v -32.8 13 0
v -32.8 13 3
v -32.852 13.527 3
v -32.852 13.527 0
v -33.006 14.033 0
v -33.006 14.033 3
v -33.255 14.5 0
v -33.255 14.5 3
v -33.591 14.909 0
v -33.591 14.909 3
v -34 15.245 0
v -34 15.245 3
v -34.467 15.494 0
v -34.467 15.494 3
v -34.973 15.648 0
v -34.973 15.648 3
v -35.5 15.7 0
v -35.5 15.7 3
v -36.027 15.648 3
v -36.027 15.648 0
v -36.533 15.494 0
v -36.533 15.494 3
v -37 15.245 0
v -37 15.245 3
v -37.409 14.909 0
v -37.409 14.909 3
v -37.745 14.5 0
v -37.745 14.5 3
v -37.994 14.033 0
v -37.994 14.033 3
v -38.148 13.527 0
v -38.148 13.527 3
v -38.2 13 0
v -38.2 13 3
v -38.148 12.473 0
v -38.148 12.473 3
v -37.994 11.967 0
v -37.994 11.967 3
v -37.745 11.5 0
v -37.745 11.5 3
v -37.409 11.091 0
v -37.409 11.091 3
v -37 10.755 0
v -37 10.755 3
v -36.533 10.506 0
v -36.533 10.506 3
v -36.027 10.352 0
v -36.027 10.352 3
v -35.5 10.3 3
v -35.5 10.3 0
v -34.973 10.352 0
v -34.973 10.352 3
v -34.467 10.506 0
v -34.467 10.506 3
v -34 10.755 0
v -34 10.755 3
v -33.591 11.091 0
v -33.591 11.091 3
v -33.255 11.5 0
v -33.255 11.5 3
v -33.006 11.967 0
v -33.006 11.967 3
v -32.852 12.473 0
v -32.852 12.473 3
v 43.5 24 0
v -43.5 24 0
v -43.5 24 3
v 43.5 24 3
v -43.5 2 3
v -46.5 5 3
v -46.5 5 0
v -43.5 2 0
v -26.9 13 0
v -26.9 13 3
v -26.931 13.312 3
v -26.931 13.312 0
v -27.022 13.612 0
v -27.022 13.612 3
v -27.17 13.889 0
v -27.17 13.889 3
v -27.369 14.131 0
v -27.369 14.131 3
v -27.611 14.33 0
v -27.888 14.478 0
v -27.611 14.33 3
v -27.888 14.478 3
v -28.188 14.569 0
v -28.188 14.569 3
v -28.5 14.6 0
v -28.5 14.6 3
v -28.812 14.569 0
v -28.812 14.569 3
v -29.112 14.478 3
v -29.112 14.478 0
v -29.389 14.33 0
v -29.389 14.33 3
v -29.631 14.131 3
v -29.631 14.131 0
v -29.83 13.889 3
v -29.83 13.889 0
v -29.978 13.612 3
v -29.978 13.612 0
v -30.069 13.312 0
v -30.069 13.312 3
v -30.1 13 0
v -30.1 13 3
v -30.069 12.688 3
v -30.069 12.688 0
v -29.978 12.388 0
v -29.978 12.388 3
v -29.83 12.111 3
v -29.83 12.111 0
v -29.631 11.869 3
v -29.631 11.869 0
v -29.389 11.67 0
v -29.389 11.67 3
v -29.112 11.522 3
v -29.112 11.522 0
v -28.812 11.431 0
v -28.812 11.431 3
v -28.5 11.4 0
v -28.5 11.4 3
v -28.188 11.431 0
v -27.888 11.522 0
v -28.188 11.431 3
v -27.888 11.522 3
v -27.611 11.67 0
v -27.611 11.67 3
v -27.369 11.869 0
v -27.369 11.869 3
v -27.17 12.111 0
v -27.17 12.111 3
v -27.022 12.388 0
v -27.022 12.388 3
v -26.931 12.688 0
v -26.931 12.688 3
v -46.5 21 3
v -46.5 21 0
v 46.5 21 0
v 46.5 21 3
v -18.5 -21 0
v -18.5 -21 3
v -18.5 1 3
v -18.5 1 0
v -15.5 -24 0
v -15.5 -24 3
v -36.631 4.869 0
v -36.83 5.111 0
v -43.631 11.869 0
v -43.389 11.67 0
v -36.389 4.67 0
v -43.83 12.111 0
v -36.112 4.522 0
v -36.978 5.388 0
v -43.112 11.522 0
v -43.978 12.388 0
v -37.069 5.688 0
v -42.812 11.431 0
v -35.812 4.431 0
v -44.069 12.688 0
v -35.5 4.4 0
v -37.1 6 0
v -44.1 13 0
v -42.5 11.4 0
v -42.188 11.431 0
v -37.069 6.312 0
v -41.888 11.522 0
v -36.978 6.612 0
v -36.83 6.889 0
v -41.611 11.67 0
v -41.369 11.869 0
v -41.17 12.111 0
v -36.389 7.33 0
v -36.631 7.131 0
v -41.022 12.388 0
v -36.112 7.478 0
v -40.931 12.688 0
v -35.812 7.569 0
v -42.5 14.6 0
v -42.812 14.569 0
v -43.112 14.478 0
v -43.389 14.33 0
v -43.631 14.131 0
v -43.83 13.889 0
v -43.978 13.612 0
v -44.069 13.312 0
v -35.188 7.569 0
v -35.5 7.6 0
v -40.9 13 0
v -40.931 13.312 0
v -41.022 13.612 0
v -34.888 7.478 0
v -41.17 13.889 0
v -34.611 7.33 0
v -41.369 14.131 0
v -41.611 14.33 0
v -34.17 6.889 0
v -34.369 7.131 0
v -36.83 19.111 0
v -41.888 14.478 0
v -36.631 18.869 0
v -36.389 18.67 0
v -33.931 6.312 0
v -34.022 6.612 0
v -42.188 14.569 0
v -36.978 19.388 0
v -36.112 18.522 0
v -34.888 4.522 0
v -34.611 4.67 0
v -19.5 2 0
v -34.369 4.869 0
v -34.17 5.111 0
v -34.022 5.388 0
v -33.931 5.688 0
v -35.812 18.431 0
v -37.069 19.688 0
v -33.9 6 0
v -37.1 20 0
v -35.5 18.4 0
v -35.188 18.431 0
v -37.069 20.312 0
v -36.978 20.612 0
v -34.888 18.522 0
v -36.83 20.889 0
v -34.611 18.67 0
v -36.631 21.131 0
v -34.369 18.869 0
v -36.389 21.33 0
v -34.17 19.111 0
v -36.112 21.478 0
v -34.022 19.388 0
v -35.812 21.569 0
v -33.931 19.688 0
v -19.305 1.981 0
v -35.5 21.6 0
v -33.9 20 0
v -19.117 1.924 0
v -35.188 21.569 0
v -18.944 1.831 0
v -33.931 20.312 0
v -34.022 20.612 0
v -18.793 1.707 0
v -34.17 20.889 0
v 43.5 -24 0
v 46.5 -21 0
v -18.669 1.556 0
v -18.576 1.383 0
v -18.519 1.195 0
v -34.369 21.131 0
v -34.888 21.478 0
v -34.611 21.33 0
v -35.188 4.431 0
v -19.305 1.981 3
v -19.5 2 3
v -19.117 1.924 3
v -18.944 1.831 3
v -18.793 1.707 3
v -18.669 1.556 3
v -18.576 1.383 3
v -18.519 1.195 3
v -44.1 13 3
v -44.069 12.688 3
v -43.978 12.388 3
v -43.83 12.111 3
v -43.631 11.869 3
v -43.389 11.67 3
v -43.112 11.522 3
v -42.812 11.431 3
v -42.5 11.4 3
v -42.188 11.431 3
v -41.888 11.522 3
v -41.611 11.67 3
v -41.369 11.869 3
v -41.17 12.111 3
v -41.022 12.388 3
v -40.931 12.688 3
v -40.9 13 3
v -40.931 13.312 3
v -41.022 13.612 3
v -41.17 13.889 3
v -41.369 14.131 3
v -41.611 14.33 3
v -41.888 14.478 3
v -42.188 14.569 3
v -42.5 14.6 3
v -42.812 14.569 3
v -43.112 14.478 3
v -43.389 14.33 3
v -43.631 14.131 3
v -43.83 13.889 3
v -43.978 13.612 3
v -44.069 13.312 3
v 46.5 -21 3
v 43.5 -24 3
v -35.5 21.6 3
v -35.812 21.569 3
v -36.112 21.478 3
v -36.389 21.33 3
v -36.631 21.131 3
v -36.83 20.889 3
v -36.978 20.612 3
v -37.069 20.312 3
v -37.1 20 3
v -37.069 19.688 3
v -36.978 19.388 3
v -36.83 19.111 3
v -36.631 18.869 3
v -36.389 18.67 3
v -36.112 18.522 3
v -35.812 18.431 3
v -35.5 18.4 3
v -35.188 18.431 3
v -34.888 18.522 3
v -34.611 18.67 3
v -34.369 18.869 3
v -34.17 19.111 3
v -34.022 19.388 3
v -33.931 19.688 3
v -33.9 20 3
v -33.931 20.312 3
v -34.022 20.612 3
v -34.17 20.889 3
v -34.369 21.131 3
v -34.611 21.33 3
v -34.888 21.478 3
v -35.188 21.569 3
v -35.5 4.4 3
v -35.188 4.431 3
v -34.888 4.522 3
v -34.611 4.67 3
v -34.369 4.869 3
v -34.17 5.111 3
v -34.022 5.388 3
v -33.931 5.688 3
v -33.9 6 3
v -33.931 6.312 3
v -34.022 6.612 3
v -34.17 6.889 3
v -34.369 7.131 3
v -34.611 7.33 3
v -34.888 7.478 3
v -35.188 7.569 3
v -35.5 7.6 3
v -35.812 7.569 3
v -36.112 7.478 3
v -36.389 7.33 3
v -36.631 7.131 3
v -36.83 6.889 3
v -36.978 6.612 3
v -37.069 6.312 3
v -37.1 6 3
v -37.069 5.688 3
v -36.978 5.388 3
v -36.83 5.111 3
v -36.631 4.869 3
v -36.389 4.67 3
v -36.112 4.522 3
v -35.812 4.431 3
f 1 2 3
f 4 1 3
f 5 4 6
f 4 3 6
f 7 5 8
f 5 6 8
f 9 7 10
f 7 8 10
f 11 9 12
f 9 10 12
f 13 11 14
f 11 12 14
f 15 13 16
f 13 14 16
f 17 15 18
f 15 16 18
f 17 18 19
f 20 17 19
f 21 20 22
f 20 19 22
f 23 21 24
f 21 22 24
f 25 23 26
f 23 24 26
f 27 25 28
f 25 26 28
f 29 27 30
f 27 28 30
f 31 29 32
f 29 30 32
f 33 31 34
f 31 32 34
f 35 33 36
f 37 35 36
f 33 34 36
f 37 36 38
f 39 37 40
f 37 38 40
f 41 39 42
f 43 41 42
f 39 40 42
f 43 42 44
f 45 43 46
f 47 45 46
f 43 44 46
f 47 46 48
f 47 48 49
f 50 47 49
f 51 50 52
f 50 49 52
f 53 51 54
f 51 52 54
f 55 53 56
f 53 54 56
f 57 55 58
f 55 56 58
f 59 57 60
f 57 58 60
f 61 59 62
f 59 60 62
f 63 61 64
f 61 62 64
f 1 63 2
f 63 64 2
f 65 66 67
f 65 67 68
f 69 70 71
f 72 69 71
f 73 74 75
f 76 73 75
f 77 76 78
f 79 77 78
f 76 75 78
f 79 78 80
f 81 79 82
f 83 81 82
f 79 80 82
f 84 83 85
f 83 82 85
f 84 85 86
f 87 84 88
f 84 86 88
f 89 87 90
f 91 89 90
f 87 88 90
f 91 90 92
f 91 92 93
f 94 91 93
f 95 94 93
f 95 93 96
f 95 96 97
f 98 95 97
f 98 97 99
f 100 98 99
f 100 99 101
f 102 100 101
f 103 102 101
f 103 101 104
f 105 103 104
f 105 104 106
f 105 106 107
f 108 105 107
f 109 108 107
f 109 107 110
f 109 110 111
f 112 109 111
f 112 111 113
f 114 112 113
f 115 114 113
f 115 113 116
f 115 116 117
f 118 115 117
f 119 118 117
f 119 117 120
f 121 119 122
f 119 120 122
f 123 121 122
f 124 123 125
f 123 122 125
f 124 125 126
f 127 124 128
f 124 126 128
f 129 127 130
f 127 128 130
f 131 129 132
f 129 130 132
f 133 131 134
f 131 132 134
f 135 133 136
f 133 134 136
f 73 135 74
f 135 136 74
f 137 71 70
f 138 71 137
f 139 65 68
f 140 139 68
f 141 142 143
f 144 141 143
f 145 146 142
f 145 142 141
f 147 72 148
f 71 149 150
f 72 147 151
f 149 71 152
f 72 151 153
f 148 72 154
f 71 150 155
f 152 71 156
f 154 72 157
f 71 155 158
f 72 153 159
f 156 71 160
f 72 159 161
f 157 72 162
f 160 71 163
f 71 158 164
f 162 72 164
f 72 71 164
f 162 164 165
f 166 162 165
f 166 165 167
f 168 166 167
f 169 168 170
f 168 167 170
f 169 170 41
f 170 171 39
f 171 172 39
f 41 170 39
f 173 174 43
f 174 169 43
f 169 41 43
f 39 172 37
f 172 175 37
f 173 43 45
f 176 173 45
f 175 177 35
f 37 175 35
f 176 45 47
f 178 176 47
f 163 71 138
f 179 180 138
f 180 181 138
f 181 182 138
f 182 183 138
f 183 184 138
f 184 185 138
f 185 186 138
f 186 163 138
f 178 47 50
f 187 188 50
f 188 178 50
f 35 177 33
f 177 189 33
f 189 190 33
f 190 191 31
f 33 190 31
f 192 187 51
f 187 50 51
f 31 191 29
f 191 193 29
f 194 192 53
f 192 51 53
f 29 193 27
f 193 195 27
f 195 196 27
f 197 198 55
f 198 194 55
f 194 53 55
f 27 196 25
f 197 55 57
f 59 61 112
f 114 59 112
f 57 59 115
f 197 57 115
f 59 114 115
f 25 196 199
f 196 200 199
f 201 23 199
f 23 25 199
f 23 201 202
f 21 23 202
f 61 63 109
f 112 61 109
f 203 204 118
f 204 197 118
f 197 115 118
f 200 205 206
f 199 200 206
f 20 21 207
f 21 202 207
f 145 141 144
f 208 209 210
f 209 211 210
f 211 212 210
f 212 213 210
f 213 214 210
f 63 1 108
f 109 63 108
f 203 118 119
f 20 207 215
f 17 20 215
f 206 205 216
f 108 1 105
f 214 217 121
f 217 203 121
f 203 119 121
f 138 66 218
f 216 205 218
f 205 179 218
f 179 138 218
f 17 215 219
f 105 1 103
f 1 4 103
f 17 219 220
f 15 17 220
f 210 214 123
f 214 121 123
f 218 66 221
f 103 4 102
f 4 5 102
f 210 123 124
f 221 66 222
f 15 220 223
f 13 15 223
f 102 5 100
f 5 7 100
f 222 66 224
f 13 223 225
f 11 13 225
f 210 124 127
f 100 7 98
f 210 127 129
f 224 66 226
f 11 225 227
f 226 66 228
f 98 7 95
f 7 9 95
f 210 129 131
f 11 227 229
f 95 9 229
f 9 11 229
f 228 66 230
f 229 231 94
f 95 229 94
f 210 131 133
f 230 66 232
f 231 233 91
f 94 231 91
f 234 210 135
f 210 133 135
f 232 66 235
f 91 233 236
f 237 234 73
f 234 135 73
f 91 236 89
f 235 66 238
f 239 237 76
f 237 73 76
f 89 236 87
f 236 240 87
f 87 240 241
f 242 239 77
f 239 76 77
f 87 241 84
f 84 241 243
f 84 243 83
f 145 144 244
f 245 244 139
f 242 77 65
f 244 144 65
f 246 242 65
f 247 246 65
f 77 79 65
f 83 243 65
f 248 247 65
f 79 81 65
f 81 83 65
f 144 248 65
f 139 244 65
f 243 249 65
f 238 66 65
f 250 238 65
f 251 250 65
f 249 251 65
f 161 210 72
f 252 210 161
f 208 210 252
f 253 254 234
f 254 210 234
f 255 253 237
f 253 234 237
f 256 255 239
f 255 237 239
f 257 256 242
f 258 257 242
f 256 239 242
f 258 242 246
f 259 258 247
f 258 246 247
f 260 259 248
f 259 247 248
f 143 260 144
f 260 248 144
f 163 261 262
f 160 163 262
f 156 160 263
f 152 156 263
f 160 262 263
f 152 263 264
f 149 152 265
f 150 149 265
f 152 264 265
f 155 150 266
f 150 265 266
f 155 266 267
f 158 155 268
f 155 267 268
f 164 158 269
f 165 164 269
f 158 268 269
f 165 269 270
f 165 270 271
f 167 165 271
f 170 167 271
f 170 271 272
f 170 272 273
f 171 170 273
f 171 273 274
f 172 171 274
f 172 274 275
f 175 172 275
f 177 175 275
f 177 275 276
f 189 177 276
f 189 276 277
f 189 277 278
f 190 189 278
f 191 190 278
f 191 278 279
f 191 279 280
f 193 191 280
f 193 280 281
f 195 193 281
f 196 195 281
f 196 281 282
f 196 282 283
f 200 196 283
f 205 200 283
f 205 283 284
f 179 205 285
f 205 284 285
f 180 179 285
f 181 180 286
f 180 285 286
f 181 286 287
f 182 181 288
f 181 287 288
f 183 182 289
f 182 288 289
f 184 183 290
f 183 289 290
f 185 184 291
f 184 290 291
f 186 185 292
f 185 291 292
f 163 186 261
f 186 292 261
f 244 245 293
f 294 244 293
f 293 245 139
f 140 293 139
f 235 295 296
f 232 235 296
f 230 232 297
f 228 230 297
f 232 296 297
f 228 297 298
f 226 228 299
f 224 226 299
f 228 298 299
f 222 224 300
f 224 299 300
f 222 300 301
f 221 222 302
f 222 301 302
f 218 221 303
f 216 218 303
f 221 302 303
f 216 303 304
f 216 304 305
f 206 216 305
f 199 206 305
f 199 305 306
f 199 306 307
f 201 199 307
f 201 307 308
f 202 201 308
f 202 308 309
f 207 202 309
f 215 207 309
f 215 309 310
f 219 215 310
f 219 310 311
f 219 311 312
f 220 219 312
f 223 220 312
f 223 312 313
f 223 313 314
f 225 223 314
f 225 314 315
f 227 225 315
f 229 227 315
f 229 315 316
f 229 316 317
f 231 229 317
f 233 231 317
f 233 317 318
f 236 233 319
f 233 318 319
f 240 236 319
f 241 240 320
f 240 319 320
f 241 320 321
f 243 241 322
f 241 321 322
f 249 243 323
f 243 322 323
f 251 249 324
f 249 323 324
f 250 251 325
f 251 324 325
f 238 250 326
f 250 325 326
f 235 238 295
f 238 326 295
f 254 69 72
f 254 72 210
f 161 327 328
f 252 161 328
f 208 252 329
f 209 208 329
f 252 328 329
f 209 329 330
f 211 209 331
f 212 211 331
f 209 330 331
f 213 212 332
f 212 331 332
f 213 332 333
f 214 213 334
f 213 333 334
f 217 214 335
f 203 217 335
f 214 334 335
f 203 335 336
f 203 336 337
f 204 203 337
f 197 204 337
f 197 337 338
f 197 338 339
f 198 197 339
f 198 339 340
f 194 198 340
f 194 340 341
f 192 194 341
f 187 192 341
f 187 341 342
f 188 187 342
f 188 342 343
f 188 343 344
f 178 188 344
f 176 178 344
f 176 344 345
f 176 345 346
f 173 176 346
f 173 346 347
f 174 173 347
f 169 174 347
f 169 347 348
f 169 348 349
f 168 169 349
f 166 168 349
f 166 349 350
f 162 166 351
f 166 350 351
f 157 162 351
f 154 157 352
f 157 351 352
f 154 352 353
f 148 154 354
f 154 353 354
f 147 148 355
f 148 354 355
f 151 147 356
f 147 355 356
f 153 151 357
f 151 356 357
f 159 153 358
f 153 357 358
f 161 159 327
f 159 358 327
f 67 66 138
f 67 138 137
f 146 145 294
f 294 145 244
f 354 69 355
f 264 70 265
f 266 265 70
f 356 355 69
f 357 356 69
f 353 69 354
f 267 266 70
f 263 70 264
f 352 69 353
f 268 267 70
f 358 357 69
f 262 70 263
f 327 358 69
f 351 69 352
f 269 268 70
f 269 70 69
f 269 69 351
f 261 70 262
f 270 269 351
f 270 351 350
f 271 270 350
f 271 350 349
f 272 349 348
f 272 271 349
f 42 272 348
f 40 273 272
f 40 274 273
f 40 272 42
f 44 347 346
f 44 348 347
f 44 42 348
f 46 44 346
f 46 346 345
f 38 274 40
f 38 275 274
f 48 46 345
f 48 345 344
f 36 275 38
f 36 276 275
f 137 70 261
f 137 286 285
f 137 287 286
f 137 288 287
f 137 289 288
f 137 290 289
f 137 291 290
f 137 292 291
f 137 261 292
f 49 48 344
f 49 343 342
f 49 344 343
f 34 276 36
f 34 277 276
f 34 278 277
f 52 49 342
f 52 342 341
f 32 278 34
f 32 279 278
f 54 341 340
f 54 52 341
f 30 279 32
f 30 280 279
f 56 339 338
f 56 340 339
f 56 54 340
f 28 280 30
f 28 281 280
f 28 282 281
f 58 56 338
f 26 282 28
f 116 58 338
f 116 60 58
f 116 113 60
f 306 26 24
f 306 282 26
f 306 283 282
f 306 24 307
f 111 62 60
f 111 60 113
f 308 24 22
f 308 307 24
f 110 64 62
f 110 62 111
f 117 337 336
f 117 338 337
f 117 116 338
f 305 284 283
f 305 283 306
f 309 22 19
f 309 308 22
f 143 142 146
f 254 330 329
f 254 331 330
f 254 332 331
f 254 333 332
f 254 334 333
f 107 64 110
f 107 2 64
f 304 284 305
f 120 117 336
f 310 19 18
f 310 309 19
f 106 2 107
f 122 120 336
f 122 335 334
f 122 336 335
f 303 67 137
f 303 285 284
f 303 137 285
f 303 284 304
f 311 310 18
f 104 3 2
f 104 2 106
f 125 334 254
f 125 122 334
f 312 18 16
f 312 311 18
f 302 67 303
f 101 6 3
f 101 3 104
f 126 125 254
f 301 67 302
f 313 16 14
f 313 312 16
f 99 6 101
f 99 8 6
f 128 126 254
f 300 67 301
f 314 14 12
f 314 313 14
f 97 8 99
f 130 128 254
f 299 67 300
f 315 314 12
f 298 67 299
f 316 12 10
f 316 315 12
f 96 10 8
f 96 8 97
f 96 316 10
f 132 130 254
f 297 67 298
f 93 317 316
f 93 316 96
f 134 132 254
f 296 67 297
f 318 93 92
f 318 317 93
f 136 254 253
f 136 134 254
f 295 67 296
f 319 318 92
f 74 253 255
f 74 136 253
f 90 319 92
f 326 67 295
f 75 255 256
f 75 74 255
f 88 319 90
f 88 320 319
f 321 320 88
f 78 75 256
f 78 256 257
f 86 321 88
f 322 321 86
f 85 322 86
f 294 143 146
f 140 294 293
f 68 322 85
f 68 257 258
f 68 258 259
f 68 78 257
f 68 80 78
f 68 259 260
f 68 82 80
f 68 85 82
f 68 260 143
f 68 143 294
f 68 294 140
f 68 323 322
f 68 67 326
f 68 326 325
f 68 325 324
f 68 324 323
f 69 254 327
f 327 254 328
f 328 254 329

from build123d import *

# Parameters (mm, degrees)
SKETCH_1_W               = 93
SKETCH_1_H               = 48
EXTRUDE_1_DEPTH          = 3
SKETCH_2_R               = 2.7
SKETCH_2_R_2             = 1.6
CUT_EXTRUDE_1_DEPTH      = 53.414215629
PATTERN_CIRCULAR_1_COUNT = 4
SKETCH_3_W               = 28
SKETCH_3_H               = 26
CUT_EXTRUDE_2_DEPTH      = 53.414215629
FILLET_1_R               = 1
CHAMFER_1_SIZE           = 3


with BuildPart() as part:
    # 草圖1 → 填料-伸長1 (new body)
    with BuildSketch(Plane.XY):
        Rectangle(SKETCH_1_W, SKETCH_1_H)
    extrude(amount=EXTRUDE_1_DEPTH)

    # 草圖2 → 除料-伸長1 (cut, through all)
    with BuildSketch(Plane.XY.offset(3)):
        with Locations((-35.5, 13)):
            Circle(SKETCH_2_R)
        with Locations((-28.5, 13)):
            Circle(SKETCH_2_R_2)
    cut_extrude_1 = extrude(amount=-CUT_EXTRUDE_1_DEPTH, mode=Mode.SUBTRACT)

    # 環狀複製排列1: 除料-伸長1 ×4 about axis
    pattern_circular_1_axis = Axis((-35.5, 13, 0), (0, 0, 1))
    for i in range(1, PATTERN_CIRCULAR_1_COUNT):
        add(cut_extrude_1.rotate(pattern_circular_1_axis, i * 360 / PATTERN_CIRCULAR_1_COUNT), mode=Mode.SUBTRACT)

    # 草圖3 → 除料-伸長2 (cut, through all)
    with BuildSketch(Plane.XY.offset(3)):
        with Locations((-32.5, -11)):
            Rectangle(SKETCH_3_W, SKETCH_3_H)
    extrude(amount=-CUT_EXTRUDE_2_DEPTH, mode=Mode.SUBTRACT)

    # 圓角1
    fillet_1_edges = [part.edges().sort_by_distance(p)[0] for p in [
        (-18.5, 2, 1.5),
    ]]
    fillet(fillet_1_edges, radius=FILLET_1_R)

    # 導角1
    chamfer_1_edges = [part.edges().sort_by_distance(p)[0] for p in [
        (-46.5, 2, 1.5),
        (-18.5, -24, 1.5),
        (-46.5, 24, 1.5),
        (46.5, 24, 1.5),
        (46.5, -24, 1.5),
    ]]
    chamfer(chamfer_1_edges, length=CHAMFER_1_SIZE)


solid = part.part
